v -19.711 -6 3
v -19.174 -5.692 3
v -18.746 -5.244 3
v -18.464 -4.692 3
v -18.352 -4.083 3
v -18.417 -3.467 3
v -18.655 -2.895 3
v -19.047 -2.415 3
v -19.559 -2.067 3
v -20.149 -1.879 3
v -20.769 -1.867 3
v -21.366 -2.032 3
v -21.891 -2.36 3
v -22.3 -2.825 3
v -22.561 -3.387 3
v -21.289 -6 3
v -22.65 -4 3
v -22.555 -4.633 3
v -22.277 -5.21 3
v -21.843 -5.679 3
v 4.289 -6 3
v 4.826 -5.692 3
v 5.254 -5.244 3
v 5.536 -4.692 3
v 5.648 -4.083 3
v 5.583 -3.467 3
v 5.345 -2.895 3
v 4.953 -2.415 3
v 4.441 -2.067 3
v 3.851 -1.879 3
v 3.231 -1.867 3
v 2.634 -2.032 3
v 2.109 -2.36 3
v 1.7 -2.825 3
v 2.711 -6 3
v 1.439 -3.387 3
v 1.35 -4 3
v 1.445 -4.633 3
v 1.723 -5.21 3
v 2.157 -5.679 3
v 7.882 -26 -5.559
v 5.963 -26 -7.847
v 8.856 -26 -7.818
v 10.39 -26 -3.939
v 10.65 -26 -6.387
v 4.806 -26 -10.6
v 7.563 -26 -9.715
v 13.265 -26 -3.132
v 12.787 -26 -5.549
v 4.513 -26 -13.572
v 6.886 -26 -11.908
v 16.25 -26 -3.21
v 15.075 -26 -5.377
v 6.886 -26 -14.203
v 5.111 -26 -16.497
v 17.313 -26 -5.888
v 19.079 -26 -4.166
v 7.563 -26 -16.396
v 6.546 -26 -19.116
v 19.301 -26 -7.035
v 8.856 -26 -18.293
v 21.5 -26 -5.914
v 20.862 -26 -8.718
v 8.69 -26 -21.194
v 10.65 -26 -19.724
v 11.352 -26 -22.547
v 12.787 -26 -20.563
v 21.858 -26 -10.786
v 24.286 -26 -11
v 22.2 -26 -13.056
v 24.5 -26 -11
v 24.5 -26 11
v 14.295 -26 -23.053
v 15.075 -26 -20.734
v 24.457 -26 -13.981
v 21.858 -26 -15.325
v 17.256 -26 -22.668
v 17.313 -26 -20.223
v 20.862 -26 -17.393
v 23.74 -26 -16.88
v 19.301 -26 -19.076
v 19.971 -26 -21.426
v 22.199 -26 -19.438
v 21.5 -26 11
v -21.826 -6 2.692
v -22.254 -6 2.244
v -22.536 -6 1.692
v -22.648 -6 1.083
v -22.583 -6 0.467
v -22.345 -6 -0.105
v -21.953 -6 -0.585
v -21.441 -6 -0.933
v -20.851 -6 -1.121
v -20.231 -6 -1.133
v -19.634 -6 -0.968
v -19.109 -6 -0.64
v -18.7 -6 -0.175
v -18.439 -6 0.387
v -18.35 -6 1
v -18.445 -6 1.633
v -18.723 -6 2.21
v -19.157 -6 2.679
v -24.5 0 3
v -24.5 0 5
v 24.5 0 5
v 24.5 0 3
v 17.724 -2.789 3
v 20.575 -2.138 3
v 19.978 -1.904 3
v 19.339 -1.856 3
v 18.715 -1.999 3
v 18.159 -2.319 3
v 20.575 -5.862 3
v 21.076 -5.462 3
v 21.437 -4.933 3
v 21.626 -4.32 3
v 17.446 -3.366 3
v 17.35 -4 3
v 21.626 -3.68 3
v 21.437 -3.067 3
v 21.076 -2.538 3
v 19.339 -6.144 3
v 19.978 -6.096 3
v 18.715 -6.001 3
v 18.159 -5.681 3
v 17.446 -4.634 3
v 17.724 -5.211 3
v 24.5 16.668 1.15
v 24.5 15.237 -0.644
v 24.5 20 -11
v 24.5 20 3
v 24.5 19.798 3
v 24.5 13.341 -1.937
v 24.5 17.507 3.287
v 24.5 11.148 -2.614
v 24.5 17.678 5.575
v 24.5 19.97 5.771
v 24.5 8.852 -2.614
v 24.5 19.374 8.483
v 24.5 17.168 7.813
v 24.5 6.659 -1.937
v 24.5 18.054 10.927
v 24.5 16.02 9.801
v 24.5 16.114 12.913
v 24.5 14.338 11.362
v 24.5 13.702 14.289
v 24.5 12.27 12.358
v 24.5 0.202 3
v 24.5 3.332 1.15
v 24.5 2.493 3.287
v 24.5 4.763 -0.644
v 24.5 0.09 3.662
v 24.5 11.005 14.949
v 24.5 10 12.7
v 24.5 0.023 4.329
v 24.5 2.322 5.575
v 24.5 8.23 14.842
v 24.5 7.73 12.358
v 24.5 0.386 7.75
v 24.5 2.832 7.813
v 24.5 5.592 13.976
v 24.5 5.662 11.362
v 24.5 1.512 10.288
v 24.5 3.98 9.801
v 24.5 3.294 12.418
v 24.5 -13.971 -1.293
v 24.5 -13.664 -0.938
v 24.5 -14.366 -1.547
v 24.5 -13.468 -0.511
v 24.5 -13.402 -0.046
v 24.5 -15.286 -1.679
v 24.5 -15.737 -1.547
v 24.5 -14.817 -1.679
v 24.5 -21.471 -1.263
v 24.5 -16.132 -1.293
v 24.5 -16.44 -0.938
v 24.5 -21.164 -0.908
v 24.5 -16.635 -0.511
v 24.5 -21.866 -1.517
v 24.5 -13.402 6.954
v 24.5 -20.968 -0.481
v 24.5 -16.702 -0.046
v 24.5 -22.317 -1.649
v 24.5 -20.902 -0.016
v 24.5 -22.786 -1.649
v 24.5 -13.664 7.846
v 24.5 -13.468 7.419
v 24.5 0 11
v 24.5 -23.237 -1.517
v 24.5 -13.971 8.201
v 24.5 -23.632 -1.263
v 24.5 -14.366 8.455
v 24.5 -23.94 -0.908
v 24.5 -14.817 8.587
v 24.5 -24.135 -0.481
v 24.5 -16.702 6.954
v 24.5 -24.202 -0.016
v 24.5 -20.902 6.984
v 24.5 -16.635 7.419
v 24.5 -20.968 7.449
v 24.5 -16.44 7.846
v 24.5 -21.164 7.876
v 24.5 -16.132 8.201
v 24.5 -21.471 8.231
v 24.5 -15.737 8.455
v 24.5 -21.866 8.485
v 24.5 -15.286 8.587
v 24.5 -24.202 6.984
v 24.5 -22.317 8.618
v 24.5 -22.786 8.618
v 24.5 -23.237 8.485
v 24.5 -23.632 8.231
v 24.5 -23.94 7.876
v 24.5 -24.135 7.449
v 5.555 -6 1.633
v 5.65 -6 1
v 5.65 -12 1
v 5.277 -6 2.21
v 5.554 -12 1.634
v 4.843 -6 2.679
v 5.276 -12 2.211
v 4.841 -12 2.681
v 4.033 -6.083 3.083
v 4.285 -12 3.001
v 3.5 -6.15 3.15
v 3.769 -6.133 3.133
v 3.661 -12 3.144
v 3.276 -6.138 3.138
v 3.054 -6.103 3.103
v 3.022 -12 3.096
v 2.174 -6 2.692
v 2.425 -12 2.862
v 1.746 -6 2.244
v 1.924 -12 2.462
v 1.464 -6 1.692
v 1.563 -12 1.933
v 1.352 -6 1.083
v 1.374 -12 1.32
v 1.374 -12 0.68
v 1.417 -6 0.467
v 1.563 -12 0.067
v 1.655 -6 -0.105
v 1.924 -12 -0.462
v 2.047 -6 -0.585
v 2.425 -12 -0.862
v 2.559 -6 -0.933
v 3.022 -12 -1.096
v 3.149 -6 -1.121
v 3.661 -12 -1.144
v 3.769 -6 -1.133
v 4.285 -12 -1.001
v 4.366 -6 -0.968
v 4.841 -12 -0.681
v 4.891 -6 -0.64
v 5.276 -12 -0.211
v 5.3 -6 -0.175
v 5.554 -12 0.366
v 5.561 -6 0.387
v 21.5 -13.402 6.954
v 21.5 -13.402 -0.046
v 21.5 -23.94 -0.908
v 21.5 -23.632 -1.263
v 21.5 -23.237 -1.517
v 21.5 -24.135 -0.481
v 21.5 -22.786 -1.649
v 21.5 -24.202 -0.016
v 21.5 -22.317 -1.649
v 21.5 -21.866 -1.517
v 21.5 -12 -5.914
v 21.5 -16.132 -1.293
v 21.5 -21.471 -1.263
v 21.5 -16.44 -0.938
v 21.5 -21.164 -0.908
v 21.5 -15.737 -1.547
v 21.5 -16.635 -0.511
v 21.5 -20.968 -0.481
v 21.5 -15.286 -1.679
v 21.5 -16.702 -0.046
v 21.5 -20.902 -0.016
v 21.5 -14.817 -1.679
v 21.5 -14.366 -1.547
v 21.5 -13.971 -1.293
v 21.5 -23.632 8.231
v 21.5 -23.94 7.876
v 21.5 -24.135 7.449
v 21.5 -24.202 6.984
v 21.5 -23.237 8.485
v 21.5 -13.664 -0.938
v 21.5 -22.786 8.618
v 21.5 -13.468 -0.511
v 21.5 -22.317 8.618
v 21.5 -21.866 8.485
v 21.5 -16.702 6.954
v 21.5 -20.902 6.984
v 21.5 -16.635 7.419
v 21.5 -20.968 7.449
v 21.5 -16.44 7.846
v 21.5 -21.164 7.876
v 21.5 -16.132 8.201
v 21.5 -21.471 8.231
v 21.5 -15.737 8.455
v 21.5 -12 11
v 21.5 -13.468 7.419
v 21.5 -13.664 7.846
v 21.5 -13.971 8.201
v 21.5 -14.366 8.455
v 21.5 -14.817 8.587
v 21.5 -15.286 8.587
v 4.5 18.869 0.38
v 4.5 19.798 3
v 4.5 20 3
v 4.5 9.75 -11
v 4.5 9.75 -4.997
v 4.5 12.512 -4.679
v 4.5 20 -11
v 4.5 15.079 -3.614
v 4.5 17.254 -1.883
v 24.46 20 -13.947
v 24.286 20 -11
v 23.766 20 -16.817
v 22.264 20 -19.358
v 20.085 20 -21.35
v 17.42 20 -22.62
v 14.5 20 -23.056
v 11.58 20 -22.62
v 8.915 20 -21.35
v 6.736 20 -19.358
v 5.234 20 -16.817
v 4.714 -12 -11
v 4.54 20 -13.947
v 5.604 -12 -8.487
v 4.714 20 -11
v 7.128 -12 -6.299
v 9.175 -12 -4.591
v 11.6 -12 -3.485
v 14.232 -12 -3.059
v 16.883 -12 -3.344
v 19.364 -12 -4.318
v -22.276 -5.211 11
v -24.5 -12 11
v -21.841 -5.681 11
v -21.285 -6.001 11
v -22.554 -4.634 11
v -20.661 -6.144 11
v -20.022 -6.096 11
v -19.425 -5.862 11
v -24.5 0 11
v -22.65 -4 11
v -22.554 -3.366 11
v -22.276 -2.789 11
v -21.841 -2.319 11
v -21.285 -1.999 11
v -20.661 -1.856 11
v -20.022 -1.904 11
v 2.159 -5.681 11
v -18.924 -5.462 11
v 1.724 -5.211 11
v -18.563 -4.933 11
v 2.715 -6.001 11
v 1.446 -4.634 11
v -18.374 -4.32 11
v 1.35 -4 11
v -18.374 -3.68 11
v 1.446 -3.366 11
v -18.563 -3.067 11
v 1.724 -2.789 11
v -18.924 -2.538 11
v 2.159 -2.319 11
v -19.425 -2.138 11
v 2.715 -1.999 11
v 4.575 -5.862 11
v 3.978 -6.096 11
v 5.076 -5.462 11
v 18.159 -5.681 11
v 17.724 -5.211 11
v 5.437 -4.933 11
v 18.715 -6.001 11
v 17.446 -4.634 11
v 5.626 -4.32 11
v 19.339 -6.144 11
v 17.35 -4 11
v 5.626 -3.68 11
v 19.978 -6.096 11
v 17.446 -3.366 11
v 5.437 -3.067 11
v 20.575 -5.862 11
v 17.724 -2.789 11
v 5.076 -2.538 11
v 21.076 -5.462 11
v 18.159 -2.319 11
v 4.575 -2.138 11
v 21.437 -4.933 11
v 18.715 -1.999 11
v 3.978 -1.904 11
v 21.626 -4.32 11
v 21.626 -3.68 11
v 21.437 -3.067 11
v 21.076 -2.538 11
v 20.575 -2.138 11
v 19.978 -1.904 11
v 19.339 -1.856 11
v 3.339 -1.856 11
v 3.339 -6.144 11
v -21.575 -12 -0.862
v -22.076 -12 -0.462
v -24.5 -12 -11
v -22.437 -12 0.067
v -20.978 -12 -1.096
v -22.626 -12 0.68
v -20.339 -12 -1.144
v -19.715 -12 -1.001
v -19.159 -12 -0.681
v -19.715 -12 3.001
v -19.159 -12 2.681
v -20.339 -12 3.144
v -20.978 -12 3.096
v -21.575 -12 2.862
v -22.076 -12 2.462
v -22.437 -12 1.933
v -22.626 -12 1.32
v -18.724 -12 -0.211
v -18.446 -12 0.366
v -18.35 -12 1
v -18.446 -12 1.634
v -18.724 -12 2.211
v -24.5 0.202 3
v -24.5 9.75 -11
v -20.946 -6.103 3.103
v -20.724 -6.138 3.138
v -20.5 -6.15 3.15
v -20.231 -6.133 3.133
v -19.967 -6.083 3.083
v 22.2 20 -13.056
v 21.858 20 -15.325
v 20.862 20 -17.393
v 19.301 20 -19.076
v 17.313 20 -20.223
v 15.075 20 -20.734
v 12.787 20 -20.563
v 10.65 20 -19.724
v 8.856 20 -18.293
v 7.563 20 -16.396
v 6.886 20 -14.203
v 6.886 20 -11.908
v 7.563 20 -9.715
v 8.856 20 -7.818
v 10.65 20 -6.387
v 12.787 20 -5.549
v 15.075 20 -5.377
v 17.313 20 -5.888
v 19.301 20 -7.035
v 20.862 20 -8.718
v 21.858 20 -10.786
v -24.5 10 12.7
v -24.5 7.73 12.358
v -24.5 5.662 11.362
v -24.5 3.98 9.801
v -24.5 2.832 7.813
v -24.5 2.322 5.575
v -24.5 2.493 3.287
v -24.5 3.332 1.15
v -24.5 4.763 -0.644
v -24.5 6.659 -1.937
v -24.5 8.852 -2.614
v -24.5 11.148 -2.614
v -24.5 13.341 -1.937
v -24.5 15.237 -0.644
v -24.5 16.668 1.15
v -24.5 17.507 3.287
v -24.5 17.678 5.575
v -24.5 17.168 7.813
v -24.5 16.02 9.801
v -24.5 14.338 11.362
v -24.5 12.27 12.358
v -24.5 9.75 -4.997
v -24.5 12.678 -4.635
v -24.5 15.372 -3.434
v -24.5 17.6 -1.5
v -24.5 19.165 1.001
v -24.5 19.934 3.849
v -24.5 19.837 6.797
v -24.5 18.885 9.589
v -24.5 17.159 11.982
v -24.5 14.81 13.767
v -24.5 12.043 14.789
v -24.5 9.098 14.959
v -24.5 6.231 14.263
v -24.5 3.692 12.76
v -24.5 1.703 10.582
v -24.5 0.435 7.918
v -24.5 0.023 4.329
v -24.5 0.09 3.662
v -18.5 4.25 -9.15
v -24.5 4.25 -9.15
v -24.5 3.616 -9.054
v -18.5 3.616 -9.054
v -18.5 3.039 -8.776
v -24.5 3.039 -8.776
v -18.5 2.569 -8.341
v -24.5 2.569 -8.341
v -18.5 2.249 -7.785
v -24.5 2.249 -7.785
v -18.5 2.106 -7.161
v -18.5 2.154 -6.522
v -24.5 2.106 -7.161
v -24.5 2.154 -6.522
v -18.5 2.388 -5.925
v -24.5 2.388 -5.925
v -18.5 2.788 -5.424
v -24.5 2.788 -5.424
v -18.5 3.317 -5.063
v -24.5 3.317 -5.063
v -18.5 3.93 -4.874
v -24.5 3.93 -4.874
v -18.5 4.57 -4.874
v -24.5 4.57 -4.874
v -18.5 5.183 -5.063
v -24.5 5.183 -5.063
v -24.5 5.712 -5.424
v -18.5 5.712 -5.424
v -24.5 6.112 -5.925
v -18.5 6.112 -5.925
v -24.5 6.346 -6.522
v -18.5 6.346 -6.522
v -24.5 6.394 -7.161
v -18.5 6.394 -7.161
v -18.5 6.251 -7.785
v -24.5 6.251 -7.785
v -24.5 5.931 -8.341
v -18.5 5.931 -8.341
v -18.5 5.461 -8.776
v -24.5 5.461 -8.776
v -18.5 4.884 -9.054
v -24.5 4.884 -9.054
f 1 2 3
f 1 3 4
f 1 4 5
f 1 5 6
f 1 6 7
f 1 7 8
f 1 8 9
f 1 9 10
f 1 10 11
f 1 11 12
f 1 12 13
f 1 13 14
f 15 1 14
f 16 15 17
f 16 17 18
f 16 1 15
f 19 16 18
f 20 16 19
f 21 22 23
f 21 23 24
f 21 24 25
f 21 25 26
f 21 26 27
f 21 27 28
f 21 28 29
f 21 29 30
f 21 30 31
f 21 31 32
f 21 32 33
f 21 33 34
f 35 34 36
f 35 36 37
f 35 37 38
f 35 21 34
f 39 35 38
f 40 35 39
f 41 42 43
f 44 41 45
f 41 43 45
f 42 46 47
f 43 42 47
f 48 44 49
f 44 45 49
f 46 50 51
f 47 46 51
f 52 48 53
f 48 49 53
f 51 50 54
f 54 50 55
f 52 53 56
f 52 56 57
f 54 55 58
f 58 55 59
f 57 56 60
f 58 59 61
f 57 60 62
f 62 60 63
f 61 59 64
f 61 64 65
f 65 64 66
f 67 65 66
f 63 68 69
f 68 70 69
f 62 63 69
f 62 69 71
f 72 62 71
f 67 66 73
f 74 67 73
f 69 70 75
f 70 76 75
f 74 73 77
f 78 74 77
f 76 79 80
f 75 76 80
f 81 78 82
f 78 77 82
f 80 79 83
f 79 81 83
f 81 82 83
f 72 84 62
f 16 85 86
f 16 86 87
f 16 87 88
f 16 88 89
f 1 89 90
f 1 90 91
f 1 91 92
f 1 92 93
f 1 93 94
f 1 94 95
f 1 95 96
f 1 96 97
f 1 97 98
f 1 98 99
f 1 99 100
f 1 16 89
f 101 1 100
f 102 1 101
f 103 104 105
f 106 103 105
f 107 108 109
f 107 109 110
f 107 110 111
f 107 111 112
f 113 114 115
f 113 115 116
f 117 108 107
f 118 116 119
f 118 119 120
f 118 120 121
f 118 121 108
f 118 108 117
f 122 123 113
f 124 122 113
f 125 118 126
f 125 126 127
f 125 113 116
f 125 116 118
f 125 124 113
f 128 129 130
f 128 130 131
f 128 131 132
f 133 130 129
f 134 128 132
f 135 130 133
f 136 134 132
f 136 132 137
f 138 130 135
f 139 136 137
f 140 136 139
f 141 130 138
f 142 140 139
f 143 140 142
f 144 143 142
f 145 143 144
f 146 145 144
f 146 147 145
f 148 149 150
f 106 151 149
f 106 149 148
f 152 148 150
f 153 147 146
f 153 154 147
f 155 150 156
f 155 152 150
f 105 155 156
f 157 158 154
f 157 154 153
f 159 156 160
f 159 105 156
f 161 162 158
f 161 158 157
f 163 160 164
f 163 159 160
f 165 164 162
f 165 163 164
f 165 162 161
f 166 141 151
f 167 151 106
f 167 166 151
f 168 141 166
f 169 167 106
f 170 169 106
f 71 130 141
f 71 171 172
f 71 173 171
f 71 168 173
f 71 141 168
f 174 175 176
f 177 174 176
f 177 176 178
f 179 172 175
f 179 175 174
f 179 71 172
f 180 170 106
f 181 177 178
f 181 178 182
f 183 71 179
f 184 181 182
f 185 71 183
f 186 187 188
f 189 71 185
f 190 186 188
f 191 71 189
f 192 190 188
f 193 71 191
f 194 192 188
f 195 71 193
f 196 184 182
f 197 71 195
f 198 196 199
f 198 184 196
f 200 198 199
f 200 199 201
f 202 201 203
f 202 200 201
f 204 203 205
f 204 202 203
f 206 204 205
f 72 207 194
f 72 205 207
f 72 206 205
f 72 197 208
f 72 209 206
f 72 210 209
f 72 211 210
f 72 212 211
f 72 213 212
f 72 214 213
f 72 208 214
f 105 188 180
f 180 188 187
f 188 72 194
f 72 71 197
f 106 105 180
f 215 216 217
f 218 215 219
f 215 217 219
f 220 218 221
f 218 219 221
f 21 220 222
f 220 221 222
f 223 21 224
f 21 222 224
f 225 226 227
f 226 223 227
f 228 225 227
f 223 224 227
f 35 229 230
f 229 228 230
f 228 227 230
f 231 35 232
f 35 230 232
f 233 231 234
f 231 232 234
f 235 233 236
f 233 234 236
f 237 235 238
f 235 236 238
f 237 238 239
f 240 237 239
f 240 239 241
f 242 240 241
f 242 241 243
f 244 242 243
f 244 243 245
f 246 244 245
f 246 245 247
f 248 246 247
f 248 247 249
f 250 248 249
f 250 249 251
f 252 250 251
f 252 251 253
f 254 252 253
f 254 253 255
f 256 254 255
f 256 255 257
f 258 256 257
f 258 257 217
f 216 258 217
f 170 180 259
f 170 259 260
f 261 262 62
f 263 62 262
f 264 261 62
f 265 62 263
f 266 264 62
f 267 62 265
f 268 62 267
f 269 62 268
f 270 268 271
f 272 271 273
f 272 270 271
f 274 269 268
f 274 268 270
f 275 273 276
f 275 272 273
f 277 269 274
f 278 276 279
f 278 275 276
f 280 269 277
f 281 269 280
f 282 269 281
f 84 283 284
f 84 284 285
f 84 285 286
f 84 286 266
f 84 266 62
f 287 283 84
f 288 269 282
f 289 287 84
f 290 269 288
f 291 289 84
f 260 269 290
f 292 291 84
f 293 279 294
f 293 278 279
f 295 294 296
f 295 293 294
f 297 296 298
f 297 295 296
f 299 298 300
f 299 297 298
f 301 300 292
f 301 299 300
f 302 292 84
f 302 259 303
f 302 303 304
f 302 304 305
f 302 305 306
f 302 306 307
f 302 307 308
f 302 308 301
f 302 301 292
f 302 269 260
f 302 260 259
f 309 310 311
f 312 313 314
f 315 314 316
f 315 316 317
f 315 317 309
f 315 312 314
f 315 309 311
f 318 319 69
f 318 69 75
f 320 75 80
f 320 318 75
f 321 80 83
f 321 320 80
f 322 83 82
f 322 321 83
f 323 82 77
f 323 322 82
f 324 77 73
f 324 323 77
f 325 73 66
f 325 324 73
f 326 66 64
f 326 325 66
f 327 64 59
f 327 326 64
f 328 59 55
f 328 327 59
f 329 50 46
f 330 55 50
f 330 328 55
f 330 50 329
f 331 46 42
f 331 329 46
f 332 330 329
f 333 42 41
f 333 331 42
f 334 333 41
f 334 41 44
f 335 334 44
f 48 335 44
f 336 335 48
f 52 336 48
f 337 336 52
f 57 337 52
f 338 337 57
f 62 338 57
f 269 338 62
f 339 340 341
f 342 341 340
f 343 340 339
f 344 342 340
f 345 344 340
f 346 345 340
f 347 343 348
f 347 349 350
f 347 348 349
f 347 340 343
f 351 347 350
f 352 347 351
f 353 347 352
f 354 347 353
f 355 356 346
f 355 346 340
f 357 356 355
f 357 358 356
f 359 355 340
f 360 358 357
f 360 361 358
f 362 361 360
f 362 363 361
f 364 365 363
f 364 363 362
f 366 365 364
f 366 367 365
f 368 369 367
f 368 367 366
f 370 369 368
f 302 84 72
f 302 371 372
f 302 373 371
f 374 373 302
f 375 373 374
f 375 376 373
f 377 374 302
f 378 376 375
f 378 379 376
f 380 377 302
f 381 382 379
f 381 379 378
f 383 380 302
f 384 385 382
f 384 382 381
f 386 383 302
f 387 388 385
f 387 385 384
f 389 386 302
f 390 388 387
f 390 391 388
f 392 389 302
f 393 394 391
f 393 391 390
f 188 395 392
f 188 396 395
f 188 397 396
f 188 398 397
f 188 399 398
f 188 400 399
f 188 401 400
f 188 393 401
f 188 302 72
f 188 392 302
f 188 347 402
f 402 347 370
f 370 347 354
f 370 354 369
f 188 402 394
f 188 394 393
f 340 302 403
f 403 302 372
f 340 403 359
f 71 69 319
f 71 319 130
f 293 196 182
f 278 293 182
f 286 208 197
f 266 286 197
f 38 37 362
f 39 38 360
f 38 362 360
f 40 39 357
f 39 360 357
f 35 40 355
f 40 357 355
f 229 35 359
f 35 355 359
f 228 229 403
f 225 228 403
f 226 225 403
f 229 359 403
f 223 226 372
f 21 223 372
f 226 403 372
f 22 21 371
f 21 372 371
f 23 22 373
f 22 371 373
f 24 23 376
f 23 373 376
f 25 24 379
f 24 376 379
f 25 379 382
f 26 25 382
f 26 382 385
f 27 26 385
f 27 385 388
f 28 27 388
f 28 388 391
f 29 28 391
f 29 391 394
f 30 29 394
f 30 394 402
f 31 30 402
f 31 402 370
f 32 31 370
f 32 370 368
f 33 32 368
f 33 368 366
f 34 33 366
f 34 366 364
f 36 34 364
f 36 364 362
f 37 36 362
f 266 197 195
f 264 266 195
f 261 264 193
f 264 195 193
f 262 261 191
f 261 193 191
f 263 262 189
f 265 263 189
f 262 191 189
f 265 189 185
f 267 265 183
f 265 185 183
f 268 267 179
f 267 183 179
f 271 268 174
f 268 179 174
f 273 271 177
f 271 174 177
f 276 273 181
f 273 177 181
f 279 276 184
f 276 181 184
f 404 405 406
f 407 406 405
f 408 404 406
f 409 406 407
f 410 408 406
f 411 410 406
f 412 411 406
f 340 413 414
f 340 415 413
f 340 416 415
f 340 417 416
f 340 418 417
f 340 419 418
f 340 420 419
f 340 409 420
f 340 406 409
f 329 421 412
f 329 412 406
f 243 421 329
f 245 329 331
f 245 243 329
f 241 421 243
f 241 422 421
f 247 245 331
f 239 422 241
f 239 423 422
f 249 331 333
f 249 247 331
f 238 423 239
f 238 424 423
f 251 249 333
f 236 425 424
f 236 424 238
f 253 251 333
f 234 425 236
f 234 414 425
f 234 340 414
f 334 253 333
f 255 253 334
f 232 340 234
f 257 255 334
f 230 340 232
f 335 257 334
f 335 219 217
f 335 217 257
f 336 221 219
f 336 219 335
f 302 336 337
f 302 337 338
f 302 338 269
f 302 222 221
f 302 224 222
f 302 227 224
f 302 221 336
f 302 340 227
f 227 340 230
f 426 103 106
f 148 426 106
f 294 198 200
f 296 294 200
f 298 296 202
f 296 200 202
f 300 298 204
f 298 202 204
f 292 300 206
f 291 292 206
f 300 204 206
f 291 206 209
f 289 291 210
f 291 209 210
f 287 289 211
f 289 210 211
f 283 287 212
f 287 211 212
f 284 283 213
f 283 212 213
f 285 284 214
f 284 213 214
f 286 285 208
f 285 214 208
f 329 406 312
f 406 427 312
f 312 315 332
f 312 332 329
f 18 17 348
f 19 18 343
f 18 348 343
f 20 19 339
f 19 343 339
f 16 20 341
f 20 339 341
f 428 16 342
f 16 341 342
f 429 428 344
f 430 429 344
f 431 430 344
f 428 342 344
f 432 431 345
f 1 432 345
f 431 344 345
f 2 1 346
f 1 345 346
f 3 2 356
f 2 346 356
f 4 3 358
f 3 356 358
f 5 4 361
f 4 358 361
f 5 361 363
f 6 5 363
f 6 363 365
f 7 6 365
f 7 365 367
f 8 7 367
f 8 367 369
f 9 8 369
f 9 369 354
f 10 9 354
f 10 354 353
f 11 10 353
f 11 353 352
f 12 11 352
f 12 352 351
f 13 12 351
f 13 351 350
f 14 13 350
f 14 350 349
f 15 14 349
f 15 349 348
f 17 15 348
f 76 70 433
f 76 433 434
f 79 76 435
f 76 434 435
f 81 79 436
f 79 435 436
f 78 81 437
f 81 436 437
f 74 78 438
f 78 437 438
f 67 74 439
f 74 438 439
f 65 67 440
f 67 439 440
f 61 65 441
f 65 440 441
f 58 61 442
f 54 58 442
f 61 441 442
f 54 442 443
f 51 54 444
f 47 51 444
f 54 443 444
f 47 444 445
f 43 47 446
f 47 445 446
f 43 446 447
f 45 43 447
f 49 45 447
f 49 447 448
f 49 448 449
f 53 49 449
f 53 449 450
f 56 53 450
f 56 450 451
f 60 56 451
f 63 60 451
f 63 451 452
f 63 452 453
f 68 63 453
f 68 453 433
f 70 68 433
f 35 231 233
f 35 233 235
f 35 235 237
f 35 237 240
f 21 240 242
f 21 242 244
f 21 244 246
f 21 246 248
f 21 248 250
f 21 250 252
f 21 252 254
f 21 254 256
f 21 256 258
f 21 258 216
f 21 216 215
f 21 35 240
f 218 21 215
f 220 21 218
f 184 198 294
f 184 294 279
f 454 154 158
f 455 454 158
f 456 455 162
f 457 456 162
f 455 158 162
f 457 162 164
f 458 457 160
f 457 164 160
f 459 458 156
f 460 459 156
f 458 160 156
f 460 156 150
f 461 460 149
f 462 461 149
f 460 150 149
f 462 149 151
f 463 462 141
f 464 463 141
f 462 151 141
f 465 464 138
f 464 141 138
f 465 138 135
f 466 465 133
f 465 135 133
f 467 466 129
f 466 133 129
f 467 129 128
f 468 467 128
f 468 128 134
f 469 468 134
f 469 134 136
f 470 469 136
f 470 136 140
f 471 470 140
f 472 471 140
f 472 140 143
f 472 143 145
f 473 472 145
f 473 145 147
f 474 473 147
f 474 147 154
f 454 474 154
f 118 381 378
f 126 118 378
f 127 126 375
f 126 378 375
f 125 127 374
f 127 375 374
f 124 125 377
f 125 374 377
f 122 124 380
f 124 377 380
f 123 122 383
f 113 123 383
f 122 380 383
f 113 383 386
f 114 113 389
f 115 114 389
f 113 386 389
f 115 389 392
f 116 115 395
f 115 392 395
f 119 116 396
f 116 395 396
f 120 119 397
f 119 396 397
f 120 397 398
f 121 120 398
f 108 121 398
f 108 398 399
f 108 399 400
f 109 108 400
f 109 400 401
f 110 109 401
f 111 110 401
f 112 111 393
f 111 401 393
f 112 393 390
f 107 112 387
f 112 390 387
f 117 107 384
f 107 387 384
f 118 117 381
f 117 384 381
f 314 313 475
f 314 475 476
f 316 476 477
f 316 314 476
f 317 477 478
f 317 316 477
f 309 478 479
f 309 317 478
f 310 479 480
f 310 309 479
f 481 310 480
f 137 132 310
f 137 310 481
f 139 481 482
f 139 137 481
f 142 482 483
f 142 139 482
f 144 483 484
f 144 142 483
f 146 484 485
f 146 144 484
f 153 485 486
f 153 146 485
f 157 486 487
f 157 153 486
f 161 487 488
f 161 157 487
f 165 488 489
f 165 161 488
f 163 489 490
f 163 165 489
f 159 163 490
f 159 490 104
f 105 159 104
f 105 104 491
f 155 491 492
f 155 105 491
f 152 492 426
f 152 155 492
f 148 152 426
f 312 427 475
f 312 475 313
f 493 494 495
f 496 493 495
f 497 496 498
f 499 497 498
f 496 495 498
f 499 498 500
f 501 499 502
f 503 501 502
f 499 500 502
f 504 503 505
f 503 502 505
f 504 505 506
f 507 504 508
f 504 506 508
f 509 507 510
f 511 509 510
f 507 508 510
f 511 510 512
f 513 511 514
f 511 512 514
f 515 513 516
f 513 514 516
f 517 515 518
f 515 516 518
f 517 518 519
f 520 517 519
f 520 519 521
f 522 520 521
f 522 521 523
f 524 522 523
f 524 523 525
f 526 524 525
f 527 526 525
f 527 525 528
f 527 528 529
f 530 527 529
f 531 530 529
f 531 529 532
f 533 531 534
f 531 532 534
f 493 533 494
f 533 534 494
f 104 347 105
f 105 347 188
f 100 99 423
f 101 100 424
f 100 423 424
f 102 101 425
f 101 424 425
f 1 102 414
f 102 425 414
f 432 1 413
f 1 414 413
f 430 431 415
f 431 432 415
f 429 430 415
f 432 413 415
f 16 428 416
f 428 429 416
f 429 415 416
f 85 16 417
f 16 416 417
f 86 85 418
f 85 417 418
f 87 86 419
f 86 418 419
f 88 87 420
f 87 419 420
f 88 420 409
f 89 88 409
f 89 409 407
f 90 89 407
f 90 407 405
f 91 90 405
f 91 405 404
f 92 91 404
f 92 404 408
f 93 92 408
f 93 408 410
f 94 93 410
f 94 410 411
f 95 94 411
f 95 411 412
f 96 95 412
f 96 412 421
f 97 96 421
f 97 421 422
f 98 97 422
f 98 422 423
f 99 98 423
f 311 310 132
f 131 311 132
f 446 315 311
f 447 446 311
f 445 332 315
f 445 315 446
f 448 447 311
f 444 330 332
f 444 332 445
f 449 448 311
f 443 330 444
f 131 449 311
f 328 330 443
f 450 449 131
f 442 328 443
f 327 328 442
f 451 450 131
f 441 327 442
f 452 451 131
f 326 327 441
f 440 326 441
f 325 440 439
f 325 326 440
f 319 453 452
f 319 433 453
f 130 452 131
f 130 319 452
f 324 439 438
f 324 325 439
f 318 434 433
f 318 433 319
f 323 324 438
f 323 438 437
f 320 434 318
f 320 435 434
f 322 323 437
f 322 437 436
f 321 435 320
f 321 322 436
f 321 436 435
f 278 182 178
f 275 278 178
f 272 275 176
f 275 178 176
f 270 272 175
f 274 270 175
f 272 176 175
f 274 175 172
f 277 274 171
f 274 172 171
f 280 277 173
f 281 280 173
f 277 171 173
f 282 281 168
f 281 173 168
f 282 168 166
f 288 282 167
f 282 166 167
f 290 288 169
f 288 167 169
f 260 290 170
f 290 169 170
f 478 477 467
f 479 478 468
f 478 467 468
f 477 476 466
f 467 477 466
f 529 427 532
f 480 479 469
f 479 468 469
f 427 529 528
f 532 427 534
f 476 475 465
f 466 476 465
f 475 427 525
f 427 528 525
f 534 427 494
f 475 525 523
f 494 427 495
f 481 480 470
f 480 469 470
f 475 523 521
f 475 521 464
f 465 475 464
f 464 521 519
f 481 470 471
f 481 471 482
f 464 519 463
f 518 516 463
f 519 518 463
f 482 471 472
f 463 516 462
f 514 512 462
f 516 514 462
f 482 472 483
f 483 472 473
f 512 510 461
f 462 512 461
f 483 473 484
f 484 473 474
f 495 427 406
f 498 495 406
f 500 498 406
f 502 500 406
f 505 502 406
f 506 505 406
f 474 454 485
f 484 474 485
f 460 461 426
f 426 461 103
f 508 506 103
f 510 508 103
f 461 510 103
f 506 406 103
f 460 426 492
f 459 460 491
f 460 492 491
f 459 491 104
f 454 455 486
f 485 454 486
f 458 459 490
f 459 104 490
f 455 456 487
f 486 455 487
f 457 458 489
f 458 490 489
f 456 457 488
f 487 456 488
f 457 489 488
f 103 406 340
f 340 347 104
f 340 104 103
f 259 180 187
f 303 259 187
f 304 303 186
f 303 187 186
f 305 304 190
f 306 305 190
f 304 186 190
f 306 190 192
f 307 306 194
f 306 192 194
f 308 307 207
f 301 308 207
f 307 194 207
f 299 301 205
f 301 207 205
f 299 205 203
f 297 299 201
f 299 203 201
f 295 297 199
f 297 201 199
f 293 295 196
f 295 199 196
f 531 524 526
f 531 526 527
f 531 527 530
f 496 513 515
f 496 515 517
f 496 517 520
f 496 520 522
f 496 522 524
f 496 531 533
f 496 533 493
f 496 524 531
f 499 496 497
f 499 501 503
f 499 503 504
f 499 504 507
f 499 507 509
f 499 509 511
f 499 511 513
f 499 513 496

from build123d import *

# Parameters (mm, degrees)
SKETCH005_W     = 49
SKETCH005_H     = 22
PAD001_DEPTH    = 12
SKETCH006_R     = 2.15
POCKET004_DEPTH = 8
SKETCH007_R     = 2.15
POCKET005_DEPTH = 6
PAD002_DEPTH    = 14
SKETCH009_R     = 2.15
POCKET006_DEPTH = 6
SKETCH010_W     = 3
SKETCH010_H     = 22
PAD003_DEPTH    = 14
POCKET007_DEPTH = 49.001
SKETCH012_R     = 10
PAD004_DEPTH    = 49
SKETCH013_R     = 10
PAD005_DEPTH    = 46
SKETCH014_R     = 7.7
POCKET008_DEPTH = 46.001
SKETCH015_R     = 7.7
POCKET009_DEPTH = 49.001


with BuildPart() as part:
    # Sketch005 → Pad001 (new body)
    with BuildSketch(Plane.XZ):
        Rectangle(SKETCH005_W, SKETCH005_H)
    extrude(amount=PAD001_DEPTH)

    # Sketch006 (on Face1 of Pad001) → Pocket004 (cut)
    with BuildSketch(Plane(origin=(0, 0, 11), x_dir=(-1, 0, 0), z_dir=(0, 0, 1))):
        with Locations((20.5, 4)):
            Circle(SKETCH006_R)
        with Locations((-19.5, 4)):
            Circle(SKETCH006_R)
        with Locations((-3.5, 4)):
            Circle(SKETCH006_R)
    extrude(amount=-POCKET004_DEPTH, mode=Mode.SUBTRACT)

    # Sketch007 (on Face4 of Pocket004) → Pocket005 (cut)
    with BuildSketch(Plane.XZ.offset(12)):
        with Locations((-20.5, 1)):
            Circle(SKETCH007_R)
        with Locations((3.5, 1)):
            Circle(SKETCH007_R)
    extrude(amount=-POCKET005_DEPTH, mode=Mode.SUBTRACT)

    # Sketch008 (on Face8 of Pocket005) → Pad002 (join)
    with BuildSketch(Plane(origin=(0, 0, -11), x_dir=(1, 0, 0), z_dir=(0, 0, -1))):
        Polygon((-24.5, 0), (-24.5, -9.75), (4.5, -9.75), (4.5, -20), (24.5, -20), (24.5, 0), align=None)
    extrude(amount=-PAD002_DEPTH)

    # Sketch009 (on Face10 of Pad002) → Pocket006 (cut)
    with BuildSketch(Plane(origin=(-24.5, 0, 0), x_dir=(0, 0, -1), z_dir=(-1, 0, 0))):
        with Locations((7, -4.25)):
            Circle(SKETCH009_R)
    extrude(amount=-POCKET006_DEPTH, mode=Mode.SUBTRACT)

    # Sketch010 (on Face4 of Pocket006) → Pad003 (join)
    with BuildSketch(Plane.XZ.offset(12)):
        with Locations((23, 0)):
            Rectangle(SKETCH010_W, SKETCH010_H)
    extrude(amount=PAD003_DEPTH)

    # Sketch011 (on Face16 of Pad003) → Pocket007 (cut, through all)
    with BuildSketch(Plane(origin=(24.5, 0, 0), x_dir=(0, 0, 1), z_dir=(1, 0, 0))):
        with BuildLine():
            ThreePointArc((6.984358, 20.901636), (8.634358, 22.551636), (6.984358, 24.201636))
            Line((6.984358, 24.201636), (-0.015642, 24.201636))
            ThreePointArc((-0.015642, 24.201636), (-1.665642, 22.551636), (-0.015642, 20.901636))
            Line((6.984358, 20.901636), (-0.015642, 20.901636))
        make_face()
        with BuildLine():
            ThreePointArc((6.953982, 13.401636), (8.603982, 15.051636), (6.953982, 16.701636))
            Line((6.953982, 16.701636), (-0.046018, 16.701636))
            ThreePointArc((-0.046018, 16.701636), (-1.696018, 15.051636), (-0.046018, 13.401636))
            Line((6.953982, 13.401636), (-0.046018, 13.401636))
        make_face()
    extrude(amount=-POCKET007_DEPTH, mode=Mode.SUBTRACT)

    # Sketch012 (on Face18 of Pocket007) → Pad004 (join)
    with BuildSketch(Plane(origin=(24.5, 0, 0), x_dir=(0, 0, 1), z_dir=(1, 0, 0))):
        with Locations((5, -10)):
            Circle(SKETCH012_R)
    extrude(amount=-PAD004_DEPTH)

    # Sketch013 (on Face40 of Pad004) → Pad005 (join)
    with BuildSketch(Plane(origin=(0, 20, 0), x_dir=(1, 0, 0), z_dir=(0, 1, 0))):
        with Locations((14.5, 13.055578)):
            Circle(SKETCH013_R)
    extrude(amount=-PAD005_DEPTH)

    # Sketch014 (on Face29 of Pad005) → Pocket008 (cut, through all)
    with BuildSketch(Plane(origin=(0, 20, 0), x_dir=(1, 0, 0), z_dir=(0, 1, 0))):
        with Locations((14.5, 13.055578)):
            Circle(SKETCH014_R)
    extrude(amount=-POCKET008_DEPTH, mode=Mode.SUBTRACT)

    # Sketch015 (on Face55 of Pocket008) → Pocket009 (cut, through all)
    with BuildSketch(Plane(origin=(24.5, 0, 0), x_dir=(0, 0, 1), z_dir=(1, 0, 0))):
        with Locations((5, -10)):
            Circle(SKETCH015_R)
    extrude(amount=-POCKET009_DEPTH, mode=Mode.SUBTRACT)


solid = part.part
